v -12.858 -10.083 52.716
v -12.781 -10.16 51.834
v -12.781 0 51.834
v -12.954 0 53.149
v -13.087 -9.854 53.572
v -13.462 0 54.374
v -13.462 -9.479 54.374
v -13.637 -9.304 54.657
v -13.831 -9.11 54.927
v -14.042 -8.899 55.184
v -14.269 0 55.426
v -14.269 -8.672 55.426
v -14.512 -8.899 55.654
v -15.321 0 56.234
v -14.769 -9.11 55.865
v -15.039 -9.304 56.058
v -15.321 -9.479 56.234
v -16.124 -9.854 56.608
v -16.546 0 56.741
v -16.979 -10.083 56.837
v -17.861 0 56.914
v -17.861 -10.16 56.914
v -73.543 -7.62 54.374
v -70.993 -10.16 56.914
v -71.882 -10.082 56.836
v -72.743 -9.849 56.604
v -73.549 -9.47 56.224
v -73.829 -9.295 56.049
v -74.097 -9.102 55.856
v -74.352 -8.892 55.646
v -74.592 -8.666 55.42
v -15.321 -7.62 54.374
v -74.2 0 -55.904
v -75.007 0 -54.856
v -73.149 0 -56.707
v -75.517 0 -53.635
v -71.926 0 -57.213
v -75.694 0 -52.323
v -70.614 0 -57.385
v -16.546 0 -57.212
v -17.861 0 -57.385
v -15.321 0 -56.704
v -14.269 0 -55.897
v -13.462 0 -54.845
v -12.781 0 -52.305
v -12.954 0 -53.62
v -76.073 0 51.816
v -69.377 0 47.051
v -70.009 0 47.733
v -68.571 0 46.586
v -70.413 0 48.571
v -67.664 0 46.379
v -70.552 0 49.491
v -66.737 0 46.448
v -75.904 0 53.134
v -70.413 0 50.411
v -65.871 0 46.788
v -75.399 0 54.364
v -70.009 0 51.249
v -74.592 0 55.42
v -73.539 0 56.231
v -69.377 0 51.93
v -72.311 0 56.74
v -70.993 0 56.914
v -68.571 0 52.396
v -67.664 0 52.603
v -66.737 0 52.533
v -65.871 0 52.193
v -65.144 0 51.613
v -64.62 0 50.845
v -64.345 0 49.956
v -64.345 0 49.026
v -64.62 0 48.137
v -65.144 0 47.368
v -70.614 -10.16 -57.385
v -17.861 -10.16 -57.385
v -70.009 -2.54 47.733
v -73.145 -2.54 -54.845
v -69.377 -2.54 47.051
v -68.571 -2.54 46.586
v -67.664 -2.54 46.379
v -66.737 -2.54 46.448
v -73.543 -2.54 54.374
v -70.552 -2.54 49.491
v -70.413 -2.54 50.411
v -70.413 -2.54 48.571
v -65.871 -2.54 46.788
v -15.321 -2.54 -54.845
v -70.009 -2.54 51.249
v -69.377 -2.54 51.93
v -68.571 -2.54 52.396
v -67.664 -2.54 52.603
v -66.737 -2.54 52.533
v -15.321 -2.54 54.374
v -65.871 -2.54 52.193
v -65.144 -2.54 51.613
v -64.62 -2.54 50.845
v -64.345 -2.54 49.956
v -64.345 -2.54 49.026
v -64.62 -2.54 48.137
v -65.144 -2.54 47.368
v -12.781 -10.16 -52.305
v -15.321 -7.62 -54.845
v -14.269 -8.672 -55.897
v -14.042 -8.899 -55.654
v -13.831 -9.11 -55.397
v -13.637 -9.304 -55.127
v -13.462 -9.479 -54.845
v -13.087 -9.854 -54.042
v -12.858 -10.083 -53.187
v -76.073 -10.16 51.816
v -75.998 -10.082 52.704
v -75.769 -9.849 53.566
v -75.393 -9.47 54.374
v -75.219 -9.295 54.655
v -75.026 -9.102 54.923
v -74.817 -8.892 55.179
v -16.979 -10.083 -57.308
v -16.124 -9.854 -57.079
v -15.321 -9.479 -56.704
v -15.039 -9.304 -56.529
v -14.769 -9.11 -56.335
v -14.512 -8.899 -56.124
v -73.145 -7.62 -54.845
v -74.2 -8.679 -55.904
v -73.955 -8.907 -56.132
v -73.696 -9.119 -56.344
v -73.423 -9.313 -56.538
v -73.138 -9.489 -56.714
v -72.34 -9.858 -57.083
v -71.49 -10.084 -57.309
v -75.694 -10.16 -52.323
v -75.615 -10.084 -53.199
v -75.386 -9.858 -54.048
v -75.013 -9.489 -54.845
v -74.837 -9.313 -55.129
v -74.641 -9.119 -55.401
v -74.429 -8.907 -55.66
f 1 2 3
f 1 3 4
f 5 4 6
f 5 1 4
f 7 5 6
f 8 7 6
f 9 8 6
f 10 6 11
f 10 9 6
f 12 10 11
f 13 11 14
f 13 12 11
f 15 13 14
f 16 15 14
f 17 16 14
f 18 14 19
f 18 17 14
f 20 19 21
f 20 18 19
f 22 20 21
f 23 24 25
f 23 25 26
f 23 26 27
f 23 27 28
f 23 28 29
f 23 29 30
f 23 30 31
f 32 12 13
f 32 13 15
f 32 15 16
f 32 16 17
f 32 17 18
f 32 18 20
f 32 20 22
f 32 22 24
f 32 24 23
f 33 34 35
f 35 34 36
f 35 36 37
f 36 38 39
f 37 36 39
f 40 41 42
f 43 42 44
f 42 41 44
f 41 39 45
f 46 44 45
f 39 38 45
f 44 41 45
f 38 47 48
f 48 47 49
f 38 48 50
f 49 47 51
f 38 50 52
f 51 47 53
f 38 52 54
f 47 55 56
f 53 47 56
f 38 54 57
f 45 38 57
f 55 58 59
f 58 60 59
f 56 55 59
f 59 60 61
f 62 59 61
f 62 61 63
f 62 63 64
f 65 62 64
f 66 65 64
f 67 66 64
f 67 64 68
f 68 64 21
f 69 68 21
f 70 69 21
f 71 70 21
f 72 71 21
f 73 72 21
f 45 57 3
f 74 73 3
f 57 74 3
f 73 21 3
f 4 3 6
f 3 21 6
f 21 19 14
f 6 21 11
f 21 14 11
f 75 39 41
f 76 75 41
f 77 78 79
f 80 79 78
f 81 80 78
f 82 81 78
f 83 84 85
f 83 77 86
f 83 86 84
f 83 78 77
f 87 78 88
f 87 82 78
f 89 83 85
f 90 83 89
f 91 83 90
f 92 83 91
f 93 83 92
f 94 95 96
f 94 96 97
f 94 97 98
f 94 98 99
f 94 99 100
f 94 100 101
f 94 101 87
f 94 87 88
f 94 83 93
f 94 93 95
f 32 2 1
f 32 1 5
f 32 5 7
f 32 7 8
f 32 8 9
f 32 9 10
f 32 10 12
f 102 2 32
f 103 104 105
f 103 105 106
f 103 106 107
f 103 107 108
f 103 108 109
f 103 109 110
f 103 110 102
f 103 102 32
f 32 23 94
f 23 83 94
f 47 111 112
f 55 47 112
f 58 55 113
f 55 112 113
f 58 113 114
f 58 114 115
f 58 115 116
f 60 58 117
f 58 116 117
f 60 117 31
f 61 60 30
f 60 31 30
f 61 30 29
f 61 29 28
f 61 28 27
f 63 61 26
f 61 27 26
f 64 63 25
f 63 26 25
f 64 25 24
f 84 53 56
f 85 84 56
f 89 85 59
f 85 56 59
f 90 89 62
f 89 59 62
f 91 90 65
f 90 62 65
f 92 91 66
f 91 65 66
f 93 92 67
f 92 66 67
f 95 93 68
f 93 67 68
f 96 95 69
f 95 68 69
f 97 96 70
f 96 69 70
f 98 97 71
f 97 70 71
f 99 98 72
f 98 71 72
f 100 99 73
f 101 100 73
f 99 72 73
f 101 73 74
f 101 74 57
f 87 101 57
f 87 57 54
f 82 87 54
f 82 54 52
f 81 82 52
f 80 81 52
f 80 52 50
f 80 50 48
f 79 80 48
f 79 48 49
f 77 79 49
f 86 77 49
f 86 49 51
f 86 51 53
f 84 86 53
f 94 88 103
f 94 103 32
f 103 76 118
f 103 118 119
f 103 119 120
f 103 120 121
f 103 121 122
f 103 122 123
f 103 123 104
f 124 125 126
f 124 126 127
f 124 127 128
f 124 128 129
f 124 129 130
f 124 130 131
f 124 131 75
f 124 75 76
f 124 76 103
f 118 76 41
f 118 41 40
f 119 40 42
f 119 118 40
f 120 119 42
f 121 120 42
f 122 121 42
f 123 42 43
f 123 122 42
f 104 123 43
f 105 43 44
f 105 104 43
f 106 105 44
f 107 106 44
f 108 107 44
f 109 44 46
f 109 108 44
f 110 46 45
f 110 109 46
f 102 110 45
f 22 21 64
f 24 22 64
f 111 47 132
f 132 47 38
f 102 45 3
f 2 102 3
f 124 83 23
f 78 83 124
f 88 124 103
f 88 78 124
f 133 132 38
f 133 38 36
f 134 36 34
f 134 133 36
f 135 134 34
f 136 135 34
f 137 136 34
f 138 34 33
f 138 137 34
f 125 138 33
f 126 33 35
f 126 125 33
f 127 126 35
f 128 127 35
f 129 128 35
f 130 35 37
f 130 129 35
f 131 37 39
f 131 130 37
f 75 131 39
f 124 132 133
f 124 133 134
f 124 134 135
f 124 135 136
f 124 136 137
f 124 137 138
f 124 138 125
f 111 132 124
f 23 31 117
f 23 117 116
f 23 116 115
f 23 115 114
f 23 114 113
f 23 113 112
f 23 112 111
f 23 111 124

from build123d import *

# Parameters (mm, degrees)
F1_DEPTH     = 12.7
F2_T         = -2.54
F3_R         = 5.08
F4_T1_DEPTH  = 109.2192415341
F4_T6_DEPTH  = 70.8878458195
F4_T11_DEPTH = 71.2857341695
F4_T16_DEPTH = 135.3482654479
F4_T23_DEPTH = 70.8878458195
F4_S24_R     = 5.08
F4_T25_DEPTH = 37
F4_T29_DEPTH = 135.3482654479
F4_S30_R     = 5.08
F4_T31_DEPTH = 69
F4_T38_DEPTH = 122.283391113
F4_S39_R     = 5.08
F4_T40_DEPTH = 63
F4_T44_DEPTH = 83.9519953984
F4_S45_R     = 5.08
F4_T46_DEPTH = 44
F4_T53_DEPTH = 84.3498837483
F4_S54_R     = 5.08
F4_T55_DEPTH = 44
F4_T59_DEPTH = 122.283391113
F4_S60_R     = 5.08
F4_T61_DEPTH = 63
F4_T68_DEPTH = 71.2857341695
F4_S69_R     = 5.08
F4_T70_DEPTH = 37
F4_T74_DEPTH = 135.3482654479
F4_S75_R     = 5.08
F4_T76_DEPTH = 69
F5_R         = 3.1205414485
F6_DEPTH     = 25.4


# Not quite as in the source:
# - a fillet or chamfer that OpenCascade refuses, or shapes differently, is made with other operations: its cross-section is extruded or revolved along the edge and cut away or added


with BuildPart() as f1:
    # F0 (on Front) → F1 (new body)
    with BuildSketch(Plane.XZ):
        Polygon((-76.0919898748, 56.9143295288), (-75.6755949615, -57.3849120053), (-12.7811351476, -57.3849120053), (-12.7811351476, 56.9143295288), align=None)
    extrude(amount=F1_DEPTH)

    # F2
    f2_openings = [f1.faces().sort_by_distance(p)[0] for p in [
        (-44.332578, -12.7, -0.172439),
    ]]
    offset(amount=F2_T, openings=f2_openings)

    # F3
    f3_edges = [f1.edges().sort_by_distance(p)[0] for p in [
        (-12.781135, -6.35, 56.91433),
        (-76.09199, -6.35, 56.91433),
        (-12.781135, -6.35, -57.384912),
        (-75.675595, -6.35, -57.384912),
    ]]
    fillet(f3_edges, radius=F3_R)

    # F4: chamfer of 5.08 on 4 edges, made by hand

    # F4_s2 → F4_t1 (cut)
    with BuildSketch(Plane.XY.offset(-54.8449120053)):
        Polygon((-10.2411351476, -12.7), (-15.3211351476, -7.62), (-15.3211351476, -12.7), align=None)
    extrude(amount=F4_T1_DEPTH, mode=Mode.SUBTRACT)


with BuildPart() as f4_tool4:
    # F4_s5 → F4_t6 (new body)
    with BuildSketch(Plane.YZ.offset(-86.2089809671)):
        Polygon((-12.7, -59.9249120053), (-7.62, -54.8449120053), (-12.7, -54.8449120053), align=None)
    extrude(amount=F4_T6_DEPTH)

    split(bisect_by=Plane(origin=(-73.3436593453, 0, -0.2671927326), x_dir=(0, 1, 0), z_dir=(0.9999933643, 0, 0.0036430001)), keep=Keep.TOP)


with BuildPart() as f1_1:
    add(f1.part)

    # F4_t3: cut F4_tool4
    add(f4_tool4.part, mode=Mode.SUBTRACT)


with BuildPart() as f4_tool9:
    # F4_s10 → F4_t11 (new body)
    with BuildSketch(Plane.YZ.offset(-15.3211351476)):
        Polygon((-12.7, 59.4543295288), (-7.62, 54.3743295288), (-12.7, 54.3743295288), align=None)
    extrude(amount=-F4_T11_DEPTH)

    split(bisect_by=Plane(origin=(-73.3436593453, 0, -0.2671927326), x_dir=(0, 1, 0), z_dir=(0.9999933643, 0, 0.0036430001)), keep=Keep.TOP)


with BuildPart() as f1_2:
    add(f1_1.part)

    # F4_t8: cut F4_tool9
    add(f4_tool9.part, mode=Mode.SUBTRACT)


with BuildPart() as f4_tool14:
    # F4_s15 → F4_t16 (new body)
    with BuildSketch(Plane(origin=(-0.2466530914, 0, 67.7055851499), x_dir=(0, 1, 0), z_dir=(0.0036430001, 0, -0.9999933643))):
        Polygon((-12.7, -78.4241460385), (-7.62, -73.3441460385), (-12.7, -73.3441460385), align=None)
    extrude(amount=F4_T16_DEPTH)

    split(bisect_by=Plane.XY.offset(54.3743295288), keep=Keep.BOTTOM)

    split(bisect_by=Plane.XY.offset(-54.8449120053), keep=Keep.TOP)


with BuildPart() as f1_3:
    add(f1_2.part)

    # F4_t13: cut F4_tool14
    add(f4_tool14.part, mode=Mode.SUBTRACT)


with BuildPart() as f4_tool21:
    # F4_s22 → F4_t23 (new body)
    with BuildSketch(Plane.YZ.offset(-86.2089809671)):
        Polygon((-12.7, -59.9249120053), (-7.62, -54.8449120053), (-12.7, -54.8449120053), align=None)
    extrude(amount=F4_T23_DEPTH)

    # F4_s24 → F4_t25 (intersect, symmetric)
    with BuildSketch(Plane.XZ.offset(10.2)):
        with Locations((-70.614067815, -52.3049120053)):
            Circle(F4_S24_R)
    extrude(amount=F4_T25_DEPTH, both=True, mode=Mode.INTERSECT)

    split(bisect_by=Plane(origin=(-73.3436593453, 0, -0.2671927326), x_dir=(0, 1, 0), z_dir=(-0.9999933643, 0, -0.0036430001)), keep=Keep.TOP)


with BuildPart() as f4_tool27:
    # F4_s28 → F4_t29 (new body)
    with BuildSketch(Plane(origin=(-0.2466530914, 0, 67.7055851499), x_dir=(0, 1, 0), z_dir=(0.0036430001, 0, -0.9999933643))):
        Polygon((-12.7, -78.4241460385), (-7.62, -73.3441460385), (-12.7, -73.3441460385), align=None)
    extrude(amount=F4_T29_DEPTH)

    # F4_s30 → F4_t31 (intersect, symmetric)
    with BuildSketch(Plane.XZ.offset(10.2)):
        with Locations((-70.614067815, -52.3049120053)):
            Circle(F4_S30_R)
    extrude(amount=F4_T31_DEPTH, both=True, mode=Mode.INTERSECT)

    split(bisect_by=Plane.XY.offset(-54.8449120053), keep=Keep.BOTTOM)


with BuildPart() as f4_tool21_1:
    add(f4_tool21.part)

    # F4_t33: intersect F4_tool27
    add(f4_tool27.part, mode=Mode.INTERSECT)


with BuildPart() as f1_4:
    add(f1_3.part)

    # F4_t19: cut F4_tool21
    add(f4_tool21_1.part, mode=Mode.SUBTRACT)


with BuildPart() as f4_tool36:
    # F4_s37 → F4_t38 (new body)
    with BuildSketch(Plane.XY.offset(-67.9090615842)):
        Polygon((-10.2411351476, -12.7), (-15.3211351476, -7.62), (-15.3211351476, -12.7), align=None)
    extrude(amount=F4_T38_DEPTH)

    # F4_s39 → F4_t40 (intersect, symmetric)
    with BuildSketch(Plane.XZ.offset(10.2)):
        with Locations((-17.8611351476, -52.3049120053)):
            Circle(F4_S39_R)
    extrude(amount=F4_T40_DEPTH, both=True, mode=Mode.INTERSECT)

    split(bisect_by=Plane.XY.offset(-54.8449120053), keep=Keep.BOTTOM)


with BuildPart() as f4_tool42:
    # F4_s43 → F4_t44 (new body)
    with BuildSketch(Plane.YZ.offset(-86.2089809671)):
        Polygon((-12.7, -59.9249120053), (-7.62, -54.8449120053), (-12.7, -54.8449120053), align=None)
    extrude(amount=F4_T44_DEPTH)

    # F4_s45 → F4_t46 (intersect, symmetric)
    with BuildSketch(Plane.XZ.offset(10.2)):
        with Locations((-17.8611351476, -52.3049120053)):
            Circle(F4_S45_R)
    extrude(amount=F4_T46_DEPTH, both=True, mode=Mode.INTERSECT)

    split(bisect_by=Plane.YZ.offset(-15.3211351476), keep=Keep.TOP)


with BuildPart() as f4_tool36_1:
    add(f4_tool36.part)

    # F4_t48: intersect F4_tool42
    add(f4_tool42.part, mode=Mode.INTERSECT)


with BuildPart() as f1_5:
    add(f1_4.part)

    # F4_t34: cut F4_tool36
    add(f4_tool36_1.part, mode=Mode.SUBTRACT)


with BuildPart() as f4_tool51:
    # F4_s52 → F4_t53 (new body)
    with BuildSketch(Plane.YZ.offset(-2.2569855688)):
        Polygon((-12.7, 59.4543295288), (-7.62, 54.3743295288), (-12.7, 54.3743295288), align=None)
    extrude(amount=-F4_T53_DEPTH)

    # F4_s54 → F4_t55 (intersect, symmetric)
    with BuildSketch(Plane.XZ.offset(10.2)):
        with Locations((-17.8611351476, 51.8343295288)):
            Circle(F4_S54_R)
    extrude(amount=F4_T55_DEPTH, both=True, mode=Mode.INTERSECT)

    split(bisect_by=Plane.YZ.offset(-15.3211351476), keep=Keep.TOP)


with BuildPart() as f4_tool57:
    # F4_s58 → F4_t59 (new body)
    with BuildSketch(Plane.XY.offset(-54.8449120053)):
        Polygon((-10.2411351476, -12.7), (-15.3211351476, -7.62), (-15.3211351476, -12.7), align=None)
    extrude(amount=F4_T59_DEPTH)

    # F4_s60 → F4_t61 (intersect, symmetric)
    with BuildSketch(Plane.XZ.offset(10.2)):
        with Locations((-17.8611351476, 51.8343295288)):
            Circle(F4_S60_R)
    extrude(amount=F4_T61_DEPTH, both=True, mode=Mode.INTERSECT)

    split(bisect_by=Plane.XY.offset(54.3743295288), keep=Keep.TOP)


with BuildPart() as f4_tool51_1:
    add(f4_tool51.part)

    # F4_t63: intersect F4_tool57
    add(f4_tool57.part, mode=Mode.INTERSECT)


with BuildPart() as f1_6:
    add(f1_5.part)

    # F4_t49: cut F4_tool51
    add(f4_tool51_1.part, mode=Mode.SUBTRACT)


with BuildPart() as f4_tool66:
    # F4_s67 → F4_t68 (new body)
    with BuildSketch(Plane.YZ.offset(-15.3211351476)):
        Polygon((-12.7, 59.4543295288), (-7.62, 54.3743295288), (-12.7, 54.3743295288), align=None)
    extrude(amount=-F4_T68_DEPTH)

    # F4_s69 → F4_t70 (intersect, symmetric)
    with BuildSketch(Plane.XZ.offset(10.2)):
        with Locations((-70.9934496016, 51.8343295288)):
            Circle(F4_S69_R)
    extrude(amount=F4_T70_DEPTH, both=True, mode=Mode.INTERSECT)

    split(bisect_by=Plane(origin=(-73.3436593453, 0, -0.2671927326), x_dir=(0, 1, 0), z_dir=(-0.9999933643, 0, -0.0036430001)), keep=Keep.TOP)


with BuildPart() as f4_tool72:
    # F4_s73 → F4_t74 (new body)
    with BuildSketch(Plane(origin=(-0.2466530914, 0, 67.7055851499), x_dir=(0, 1, 0), z_dir=(0.0036430001, 0, -0.9999933643))):
        Polygon((-12.7, -78.4241460385), (-7.62, -73.3441460385), (-12.7, -73.3441460385), align=None)
    extrude(amount=F4_T74_DEPTH)

    # F4_s75 → F4_t76 (intersect, symmetric)
    with BuildSketch(Plane.XZ.offset(10.2)):
        with Locations((-70.9934496016, 51.8343295288)):
            Circle(F4_S75_R)
    extrude(amount=F4_T76_DEPTH, both=True, mode=Mode.INTERSECT)

    split(bisect_by=Plane.XY.offset(54.3743295288), keep=Keep.TOP)


with BuildPart() as f4_tool66_1:
    add(f4_tool66.part)

    # F4_t78: intersect F4_tool72
    add(f4_tool72.part, mode=Mode.INTERSECT)


with BuildPart() as f1_7:
    add(f1_6.part)

    # F4_t64: cut F4_tool66
    add(f4_tool66_1.part, mode=Mode.SUBTRACT)

    # F5 (on face) → F6 (cut)
    with BuildSketch(Plane(origin=(0, 0, 0), x_dir=(-1, 0, 0), z_dir=(0, 1, 0))):
        with Locations((67.4311071634, 49.4907200336)):
            Circle(F5_R)
    extrude(amount=-F6_DEPTH, mode=Mode.SUBTRACT)


solid = f1_7.part
